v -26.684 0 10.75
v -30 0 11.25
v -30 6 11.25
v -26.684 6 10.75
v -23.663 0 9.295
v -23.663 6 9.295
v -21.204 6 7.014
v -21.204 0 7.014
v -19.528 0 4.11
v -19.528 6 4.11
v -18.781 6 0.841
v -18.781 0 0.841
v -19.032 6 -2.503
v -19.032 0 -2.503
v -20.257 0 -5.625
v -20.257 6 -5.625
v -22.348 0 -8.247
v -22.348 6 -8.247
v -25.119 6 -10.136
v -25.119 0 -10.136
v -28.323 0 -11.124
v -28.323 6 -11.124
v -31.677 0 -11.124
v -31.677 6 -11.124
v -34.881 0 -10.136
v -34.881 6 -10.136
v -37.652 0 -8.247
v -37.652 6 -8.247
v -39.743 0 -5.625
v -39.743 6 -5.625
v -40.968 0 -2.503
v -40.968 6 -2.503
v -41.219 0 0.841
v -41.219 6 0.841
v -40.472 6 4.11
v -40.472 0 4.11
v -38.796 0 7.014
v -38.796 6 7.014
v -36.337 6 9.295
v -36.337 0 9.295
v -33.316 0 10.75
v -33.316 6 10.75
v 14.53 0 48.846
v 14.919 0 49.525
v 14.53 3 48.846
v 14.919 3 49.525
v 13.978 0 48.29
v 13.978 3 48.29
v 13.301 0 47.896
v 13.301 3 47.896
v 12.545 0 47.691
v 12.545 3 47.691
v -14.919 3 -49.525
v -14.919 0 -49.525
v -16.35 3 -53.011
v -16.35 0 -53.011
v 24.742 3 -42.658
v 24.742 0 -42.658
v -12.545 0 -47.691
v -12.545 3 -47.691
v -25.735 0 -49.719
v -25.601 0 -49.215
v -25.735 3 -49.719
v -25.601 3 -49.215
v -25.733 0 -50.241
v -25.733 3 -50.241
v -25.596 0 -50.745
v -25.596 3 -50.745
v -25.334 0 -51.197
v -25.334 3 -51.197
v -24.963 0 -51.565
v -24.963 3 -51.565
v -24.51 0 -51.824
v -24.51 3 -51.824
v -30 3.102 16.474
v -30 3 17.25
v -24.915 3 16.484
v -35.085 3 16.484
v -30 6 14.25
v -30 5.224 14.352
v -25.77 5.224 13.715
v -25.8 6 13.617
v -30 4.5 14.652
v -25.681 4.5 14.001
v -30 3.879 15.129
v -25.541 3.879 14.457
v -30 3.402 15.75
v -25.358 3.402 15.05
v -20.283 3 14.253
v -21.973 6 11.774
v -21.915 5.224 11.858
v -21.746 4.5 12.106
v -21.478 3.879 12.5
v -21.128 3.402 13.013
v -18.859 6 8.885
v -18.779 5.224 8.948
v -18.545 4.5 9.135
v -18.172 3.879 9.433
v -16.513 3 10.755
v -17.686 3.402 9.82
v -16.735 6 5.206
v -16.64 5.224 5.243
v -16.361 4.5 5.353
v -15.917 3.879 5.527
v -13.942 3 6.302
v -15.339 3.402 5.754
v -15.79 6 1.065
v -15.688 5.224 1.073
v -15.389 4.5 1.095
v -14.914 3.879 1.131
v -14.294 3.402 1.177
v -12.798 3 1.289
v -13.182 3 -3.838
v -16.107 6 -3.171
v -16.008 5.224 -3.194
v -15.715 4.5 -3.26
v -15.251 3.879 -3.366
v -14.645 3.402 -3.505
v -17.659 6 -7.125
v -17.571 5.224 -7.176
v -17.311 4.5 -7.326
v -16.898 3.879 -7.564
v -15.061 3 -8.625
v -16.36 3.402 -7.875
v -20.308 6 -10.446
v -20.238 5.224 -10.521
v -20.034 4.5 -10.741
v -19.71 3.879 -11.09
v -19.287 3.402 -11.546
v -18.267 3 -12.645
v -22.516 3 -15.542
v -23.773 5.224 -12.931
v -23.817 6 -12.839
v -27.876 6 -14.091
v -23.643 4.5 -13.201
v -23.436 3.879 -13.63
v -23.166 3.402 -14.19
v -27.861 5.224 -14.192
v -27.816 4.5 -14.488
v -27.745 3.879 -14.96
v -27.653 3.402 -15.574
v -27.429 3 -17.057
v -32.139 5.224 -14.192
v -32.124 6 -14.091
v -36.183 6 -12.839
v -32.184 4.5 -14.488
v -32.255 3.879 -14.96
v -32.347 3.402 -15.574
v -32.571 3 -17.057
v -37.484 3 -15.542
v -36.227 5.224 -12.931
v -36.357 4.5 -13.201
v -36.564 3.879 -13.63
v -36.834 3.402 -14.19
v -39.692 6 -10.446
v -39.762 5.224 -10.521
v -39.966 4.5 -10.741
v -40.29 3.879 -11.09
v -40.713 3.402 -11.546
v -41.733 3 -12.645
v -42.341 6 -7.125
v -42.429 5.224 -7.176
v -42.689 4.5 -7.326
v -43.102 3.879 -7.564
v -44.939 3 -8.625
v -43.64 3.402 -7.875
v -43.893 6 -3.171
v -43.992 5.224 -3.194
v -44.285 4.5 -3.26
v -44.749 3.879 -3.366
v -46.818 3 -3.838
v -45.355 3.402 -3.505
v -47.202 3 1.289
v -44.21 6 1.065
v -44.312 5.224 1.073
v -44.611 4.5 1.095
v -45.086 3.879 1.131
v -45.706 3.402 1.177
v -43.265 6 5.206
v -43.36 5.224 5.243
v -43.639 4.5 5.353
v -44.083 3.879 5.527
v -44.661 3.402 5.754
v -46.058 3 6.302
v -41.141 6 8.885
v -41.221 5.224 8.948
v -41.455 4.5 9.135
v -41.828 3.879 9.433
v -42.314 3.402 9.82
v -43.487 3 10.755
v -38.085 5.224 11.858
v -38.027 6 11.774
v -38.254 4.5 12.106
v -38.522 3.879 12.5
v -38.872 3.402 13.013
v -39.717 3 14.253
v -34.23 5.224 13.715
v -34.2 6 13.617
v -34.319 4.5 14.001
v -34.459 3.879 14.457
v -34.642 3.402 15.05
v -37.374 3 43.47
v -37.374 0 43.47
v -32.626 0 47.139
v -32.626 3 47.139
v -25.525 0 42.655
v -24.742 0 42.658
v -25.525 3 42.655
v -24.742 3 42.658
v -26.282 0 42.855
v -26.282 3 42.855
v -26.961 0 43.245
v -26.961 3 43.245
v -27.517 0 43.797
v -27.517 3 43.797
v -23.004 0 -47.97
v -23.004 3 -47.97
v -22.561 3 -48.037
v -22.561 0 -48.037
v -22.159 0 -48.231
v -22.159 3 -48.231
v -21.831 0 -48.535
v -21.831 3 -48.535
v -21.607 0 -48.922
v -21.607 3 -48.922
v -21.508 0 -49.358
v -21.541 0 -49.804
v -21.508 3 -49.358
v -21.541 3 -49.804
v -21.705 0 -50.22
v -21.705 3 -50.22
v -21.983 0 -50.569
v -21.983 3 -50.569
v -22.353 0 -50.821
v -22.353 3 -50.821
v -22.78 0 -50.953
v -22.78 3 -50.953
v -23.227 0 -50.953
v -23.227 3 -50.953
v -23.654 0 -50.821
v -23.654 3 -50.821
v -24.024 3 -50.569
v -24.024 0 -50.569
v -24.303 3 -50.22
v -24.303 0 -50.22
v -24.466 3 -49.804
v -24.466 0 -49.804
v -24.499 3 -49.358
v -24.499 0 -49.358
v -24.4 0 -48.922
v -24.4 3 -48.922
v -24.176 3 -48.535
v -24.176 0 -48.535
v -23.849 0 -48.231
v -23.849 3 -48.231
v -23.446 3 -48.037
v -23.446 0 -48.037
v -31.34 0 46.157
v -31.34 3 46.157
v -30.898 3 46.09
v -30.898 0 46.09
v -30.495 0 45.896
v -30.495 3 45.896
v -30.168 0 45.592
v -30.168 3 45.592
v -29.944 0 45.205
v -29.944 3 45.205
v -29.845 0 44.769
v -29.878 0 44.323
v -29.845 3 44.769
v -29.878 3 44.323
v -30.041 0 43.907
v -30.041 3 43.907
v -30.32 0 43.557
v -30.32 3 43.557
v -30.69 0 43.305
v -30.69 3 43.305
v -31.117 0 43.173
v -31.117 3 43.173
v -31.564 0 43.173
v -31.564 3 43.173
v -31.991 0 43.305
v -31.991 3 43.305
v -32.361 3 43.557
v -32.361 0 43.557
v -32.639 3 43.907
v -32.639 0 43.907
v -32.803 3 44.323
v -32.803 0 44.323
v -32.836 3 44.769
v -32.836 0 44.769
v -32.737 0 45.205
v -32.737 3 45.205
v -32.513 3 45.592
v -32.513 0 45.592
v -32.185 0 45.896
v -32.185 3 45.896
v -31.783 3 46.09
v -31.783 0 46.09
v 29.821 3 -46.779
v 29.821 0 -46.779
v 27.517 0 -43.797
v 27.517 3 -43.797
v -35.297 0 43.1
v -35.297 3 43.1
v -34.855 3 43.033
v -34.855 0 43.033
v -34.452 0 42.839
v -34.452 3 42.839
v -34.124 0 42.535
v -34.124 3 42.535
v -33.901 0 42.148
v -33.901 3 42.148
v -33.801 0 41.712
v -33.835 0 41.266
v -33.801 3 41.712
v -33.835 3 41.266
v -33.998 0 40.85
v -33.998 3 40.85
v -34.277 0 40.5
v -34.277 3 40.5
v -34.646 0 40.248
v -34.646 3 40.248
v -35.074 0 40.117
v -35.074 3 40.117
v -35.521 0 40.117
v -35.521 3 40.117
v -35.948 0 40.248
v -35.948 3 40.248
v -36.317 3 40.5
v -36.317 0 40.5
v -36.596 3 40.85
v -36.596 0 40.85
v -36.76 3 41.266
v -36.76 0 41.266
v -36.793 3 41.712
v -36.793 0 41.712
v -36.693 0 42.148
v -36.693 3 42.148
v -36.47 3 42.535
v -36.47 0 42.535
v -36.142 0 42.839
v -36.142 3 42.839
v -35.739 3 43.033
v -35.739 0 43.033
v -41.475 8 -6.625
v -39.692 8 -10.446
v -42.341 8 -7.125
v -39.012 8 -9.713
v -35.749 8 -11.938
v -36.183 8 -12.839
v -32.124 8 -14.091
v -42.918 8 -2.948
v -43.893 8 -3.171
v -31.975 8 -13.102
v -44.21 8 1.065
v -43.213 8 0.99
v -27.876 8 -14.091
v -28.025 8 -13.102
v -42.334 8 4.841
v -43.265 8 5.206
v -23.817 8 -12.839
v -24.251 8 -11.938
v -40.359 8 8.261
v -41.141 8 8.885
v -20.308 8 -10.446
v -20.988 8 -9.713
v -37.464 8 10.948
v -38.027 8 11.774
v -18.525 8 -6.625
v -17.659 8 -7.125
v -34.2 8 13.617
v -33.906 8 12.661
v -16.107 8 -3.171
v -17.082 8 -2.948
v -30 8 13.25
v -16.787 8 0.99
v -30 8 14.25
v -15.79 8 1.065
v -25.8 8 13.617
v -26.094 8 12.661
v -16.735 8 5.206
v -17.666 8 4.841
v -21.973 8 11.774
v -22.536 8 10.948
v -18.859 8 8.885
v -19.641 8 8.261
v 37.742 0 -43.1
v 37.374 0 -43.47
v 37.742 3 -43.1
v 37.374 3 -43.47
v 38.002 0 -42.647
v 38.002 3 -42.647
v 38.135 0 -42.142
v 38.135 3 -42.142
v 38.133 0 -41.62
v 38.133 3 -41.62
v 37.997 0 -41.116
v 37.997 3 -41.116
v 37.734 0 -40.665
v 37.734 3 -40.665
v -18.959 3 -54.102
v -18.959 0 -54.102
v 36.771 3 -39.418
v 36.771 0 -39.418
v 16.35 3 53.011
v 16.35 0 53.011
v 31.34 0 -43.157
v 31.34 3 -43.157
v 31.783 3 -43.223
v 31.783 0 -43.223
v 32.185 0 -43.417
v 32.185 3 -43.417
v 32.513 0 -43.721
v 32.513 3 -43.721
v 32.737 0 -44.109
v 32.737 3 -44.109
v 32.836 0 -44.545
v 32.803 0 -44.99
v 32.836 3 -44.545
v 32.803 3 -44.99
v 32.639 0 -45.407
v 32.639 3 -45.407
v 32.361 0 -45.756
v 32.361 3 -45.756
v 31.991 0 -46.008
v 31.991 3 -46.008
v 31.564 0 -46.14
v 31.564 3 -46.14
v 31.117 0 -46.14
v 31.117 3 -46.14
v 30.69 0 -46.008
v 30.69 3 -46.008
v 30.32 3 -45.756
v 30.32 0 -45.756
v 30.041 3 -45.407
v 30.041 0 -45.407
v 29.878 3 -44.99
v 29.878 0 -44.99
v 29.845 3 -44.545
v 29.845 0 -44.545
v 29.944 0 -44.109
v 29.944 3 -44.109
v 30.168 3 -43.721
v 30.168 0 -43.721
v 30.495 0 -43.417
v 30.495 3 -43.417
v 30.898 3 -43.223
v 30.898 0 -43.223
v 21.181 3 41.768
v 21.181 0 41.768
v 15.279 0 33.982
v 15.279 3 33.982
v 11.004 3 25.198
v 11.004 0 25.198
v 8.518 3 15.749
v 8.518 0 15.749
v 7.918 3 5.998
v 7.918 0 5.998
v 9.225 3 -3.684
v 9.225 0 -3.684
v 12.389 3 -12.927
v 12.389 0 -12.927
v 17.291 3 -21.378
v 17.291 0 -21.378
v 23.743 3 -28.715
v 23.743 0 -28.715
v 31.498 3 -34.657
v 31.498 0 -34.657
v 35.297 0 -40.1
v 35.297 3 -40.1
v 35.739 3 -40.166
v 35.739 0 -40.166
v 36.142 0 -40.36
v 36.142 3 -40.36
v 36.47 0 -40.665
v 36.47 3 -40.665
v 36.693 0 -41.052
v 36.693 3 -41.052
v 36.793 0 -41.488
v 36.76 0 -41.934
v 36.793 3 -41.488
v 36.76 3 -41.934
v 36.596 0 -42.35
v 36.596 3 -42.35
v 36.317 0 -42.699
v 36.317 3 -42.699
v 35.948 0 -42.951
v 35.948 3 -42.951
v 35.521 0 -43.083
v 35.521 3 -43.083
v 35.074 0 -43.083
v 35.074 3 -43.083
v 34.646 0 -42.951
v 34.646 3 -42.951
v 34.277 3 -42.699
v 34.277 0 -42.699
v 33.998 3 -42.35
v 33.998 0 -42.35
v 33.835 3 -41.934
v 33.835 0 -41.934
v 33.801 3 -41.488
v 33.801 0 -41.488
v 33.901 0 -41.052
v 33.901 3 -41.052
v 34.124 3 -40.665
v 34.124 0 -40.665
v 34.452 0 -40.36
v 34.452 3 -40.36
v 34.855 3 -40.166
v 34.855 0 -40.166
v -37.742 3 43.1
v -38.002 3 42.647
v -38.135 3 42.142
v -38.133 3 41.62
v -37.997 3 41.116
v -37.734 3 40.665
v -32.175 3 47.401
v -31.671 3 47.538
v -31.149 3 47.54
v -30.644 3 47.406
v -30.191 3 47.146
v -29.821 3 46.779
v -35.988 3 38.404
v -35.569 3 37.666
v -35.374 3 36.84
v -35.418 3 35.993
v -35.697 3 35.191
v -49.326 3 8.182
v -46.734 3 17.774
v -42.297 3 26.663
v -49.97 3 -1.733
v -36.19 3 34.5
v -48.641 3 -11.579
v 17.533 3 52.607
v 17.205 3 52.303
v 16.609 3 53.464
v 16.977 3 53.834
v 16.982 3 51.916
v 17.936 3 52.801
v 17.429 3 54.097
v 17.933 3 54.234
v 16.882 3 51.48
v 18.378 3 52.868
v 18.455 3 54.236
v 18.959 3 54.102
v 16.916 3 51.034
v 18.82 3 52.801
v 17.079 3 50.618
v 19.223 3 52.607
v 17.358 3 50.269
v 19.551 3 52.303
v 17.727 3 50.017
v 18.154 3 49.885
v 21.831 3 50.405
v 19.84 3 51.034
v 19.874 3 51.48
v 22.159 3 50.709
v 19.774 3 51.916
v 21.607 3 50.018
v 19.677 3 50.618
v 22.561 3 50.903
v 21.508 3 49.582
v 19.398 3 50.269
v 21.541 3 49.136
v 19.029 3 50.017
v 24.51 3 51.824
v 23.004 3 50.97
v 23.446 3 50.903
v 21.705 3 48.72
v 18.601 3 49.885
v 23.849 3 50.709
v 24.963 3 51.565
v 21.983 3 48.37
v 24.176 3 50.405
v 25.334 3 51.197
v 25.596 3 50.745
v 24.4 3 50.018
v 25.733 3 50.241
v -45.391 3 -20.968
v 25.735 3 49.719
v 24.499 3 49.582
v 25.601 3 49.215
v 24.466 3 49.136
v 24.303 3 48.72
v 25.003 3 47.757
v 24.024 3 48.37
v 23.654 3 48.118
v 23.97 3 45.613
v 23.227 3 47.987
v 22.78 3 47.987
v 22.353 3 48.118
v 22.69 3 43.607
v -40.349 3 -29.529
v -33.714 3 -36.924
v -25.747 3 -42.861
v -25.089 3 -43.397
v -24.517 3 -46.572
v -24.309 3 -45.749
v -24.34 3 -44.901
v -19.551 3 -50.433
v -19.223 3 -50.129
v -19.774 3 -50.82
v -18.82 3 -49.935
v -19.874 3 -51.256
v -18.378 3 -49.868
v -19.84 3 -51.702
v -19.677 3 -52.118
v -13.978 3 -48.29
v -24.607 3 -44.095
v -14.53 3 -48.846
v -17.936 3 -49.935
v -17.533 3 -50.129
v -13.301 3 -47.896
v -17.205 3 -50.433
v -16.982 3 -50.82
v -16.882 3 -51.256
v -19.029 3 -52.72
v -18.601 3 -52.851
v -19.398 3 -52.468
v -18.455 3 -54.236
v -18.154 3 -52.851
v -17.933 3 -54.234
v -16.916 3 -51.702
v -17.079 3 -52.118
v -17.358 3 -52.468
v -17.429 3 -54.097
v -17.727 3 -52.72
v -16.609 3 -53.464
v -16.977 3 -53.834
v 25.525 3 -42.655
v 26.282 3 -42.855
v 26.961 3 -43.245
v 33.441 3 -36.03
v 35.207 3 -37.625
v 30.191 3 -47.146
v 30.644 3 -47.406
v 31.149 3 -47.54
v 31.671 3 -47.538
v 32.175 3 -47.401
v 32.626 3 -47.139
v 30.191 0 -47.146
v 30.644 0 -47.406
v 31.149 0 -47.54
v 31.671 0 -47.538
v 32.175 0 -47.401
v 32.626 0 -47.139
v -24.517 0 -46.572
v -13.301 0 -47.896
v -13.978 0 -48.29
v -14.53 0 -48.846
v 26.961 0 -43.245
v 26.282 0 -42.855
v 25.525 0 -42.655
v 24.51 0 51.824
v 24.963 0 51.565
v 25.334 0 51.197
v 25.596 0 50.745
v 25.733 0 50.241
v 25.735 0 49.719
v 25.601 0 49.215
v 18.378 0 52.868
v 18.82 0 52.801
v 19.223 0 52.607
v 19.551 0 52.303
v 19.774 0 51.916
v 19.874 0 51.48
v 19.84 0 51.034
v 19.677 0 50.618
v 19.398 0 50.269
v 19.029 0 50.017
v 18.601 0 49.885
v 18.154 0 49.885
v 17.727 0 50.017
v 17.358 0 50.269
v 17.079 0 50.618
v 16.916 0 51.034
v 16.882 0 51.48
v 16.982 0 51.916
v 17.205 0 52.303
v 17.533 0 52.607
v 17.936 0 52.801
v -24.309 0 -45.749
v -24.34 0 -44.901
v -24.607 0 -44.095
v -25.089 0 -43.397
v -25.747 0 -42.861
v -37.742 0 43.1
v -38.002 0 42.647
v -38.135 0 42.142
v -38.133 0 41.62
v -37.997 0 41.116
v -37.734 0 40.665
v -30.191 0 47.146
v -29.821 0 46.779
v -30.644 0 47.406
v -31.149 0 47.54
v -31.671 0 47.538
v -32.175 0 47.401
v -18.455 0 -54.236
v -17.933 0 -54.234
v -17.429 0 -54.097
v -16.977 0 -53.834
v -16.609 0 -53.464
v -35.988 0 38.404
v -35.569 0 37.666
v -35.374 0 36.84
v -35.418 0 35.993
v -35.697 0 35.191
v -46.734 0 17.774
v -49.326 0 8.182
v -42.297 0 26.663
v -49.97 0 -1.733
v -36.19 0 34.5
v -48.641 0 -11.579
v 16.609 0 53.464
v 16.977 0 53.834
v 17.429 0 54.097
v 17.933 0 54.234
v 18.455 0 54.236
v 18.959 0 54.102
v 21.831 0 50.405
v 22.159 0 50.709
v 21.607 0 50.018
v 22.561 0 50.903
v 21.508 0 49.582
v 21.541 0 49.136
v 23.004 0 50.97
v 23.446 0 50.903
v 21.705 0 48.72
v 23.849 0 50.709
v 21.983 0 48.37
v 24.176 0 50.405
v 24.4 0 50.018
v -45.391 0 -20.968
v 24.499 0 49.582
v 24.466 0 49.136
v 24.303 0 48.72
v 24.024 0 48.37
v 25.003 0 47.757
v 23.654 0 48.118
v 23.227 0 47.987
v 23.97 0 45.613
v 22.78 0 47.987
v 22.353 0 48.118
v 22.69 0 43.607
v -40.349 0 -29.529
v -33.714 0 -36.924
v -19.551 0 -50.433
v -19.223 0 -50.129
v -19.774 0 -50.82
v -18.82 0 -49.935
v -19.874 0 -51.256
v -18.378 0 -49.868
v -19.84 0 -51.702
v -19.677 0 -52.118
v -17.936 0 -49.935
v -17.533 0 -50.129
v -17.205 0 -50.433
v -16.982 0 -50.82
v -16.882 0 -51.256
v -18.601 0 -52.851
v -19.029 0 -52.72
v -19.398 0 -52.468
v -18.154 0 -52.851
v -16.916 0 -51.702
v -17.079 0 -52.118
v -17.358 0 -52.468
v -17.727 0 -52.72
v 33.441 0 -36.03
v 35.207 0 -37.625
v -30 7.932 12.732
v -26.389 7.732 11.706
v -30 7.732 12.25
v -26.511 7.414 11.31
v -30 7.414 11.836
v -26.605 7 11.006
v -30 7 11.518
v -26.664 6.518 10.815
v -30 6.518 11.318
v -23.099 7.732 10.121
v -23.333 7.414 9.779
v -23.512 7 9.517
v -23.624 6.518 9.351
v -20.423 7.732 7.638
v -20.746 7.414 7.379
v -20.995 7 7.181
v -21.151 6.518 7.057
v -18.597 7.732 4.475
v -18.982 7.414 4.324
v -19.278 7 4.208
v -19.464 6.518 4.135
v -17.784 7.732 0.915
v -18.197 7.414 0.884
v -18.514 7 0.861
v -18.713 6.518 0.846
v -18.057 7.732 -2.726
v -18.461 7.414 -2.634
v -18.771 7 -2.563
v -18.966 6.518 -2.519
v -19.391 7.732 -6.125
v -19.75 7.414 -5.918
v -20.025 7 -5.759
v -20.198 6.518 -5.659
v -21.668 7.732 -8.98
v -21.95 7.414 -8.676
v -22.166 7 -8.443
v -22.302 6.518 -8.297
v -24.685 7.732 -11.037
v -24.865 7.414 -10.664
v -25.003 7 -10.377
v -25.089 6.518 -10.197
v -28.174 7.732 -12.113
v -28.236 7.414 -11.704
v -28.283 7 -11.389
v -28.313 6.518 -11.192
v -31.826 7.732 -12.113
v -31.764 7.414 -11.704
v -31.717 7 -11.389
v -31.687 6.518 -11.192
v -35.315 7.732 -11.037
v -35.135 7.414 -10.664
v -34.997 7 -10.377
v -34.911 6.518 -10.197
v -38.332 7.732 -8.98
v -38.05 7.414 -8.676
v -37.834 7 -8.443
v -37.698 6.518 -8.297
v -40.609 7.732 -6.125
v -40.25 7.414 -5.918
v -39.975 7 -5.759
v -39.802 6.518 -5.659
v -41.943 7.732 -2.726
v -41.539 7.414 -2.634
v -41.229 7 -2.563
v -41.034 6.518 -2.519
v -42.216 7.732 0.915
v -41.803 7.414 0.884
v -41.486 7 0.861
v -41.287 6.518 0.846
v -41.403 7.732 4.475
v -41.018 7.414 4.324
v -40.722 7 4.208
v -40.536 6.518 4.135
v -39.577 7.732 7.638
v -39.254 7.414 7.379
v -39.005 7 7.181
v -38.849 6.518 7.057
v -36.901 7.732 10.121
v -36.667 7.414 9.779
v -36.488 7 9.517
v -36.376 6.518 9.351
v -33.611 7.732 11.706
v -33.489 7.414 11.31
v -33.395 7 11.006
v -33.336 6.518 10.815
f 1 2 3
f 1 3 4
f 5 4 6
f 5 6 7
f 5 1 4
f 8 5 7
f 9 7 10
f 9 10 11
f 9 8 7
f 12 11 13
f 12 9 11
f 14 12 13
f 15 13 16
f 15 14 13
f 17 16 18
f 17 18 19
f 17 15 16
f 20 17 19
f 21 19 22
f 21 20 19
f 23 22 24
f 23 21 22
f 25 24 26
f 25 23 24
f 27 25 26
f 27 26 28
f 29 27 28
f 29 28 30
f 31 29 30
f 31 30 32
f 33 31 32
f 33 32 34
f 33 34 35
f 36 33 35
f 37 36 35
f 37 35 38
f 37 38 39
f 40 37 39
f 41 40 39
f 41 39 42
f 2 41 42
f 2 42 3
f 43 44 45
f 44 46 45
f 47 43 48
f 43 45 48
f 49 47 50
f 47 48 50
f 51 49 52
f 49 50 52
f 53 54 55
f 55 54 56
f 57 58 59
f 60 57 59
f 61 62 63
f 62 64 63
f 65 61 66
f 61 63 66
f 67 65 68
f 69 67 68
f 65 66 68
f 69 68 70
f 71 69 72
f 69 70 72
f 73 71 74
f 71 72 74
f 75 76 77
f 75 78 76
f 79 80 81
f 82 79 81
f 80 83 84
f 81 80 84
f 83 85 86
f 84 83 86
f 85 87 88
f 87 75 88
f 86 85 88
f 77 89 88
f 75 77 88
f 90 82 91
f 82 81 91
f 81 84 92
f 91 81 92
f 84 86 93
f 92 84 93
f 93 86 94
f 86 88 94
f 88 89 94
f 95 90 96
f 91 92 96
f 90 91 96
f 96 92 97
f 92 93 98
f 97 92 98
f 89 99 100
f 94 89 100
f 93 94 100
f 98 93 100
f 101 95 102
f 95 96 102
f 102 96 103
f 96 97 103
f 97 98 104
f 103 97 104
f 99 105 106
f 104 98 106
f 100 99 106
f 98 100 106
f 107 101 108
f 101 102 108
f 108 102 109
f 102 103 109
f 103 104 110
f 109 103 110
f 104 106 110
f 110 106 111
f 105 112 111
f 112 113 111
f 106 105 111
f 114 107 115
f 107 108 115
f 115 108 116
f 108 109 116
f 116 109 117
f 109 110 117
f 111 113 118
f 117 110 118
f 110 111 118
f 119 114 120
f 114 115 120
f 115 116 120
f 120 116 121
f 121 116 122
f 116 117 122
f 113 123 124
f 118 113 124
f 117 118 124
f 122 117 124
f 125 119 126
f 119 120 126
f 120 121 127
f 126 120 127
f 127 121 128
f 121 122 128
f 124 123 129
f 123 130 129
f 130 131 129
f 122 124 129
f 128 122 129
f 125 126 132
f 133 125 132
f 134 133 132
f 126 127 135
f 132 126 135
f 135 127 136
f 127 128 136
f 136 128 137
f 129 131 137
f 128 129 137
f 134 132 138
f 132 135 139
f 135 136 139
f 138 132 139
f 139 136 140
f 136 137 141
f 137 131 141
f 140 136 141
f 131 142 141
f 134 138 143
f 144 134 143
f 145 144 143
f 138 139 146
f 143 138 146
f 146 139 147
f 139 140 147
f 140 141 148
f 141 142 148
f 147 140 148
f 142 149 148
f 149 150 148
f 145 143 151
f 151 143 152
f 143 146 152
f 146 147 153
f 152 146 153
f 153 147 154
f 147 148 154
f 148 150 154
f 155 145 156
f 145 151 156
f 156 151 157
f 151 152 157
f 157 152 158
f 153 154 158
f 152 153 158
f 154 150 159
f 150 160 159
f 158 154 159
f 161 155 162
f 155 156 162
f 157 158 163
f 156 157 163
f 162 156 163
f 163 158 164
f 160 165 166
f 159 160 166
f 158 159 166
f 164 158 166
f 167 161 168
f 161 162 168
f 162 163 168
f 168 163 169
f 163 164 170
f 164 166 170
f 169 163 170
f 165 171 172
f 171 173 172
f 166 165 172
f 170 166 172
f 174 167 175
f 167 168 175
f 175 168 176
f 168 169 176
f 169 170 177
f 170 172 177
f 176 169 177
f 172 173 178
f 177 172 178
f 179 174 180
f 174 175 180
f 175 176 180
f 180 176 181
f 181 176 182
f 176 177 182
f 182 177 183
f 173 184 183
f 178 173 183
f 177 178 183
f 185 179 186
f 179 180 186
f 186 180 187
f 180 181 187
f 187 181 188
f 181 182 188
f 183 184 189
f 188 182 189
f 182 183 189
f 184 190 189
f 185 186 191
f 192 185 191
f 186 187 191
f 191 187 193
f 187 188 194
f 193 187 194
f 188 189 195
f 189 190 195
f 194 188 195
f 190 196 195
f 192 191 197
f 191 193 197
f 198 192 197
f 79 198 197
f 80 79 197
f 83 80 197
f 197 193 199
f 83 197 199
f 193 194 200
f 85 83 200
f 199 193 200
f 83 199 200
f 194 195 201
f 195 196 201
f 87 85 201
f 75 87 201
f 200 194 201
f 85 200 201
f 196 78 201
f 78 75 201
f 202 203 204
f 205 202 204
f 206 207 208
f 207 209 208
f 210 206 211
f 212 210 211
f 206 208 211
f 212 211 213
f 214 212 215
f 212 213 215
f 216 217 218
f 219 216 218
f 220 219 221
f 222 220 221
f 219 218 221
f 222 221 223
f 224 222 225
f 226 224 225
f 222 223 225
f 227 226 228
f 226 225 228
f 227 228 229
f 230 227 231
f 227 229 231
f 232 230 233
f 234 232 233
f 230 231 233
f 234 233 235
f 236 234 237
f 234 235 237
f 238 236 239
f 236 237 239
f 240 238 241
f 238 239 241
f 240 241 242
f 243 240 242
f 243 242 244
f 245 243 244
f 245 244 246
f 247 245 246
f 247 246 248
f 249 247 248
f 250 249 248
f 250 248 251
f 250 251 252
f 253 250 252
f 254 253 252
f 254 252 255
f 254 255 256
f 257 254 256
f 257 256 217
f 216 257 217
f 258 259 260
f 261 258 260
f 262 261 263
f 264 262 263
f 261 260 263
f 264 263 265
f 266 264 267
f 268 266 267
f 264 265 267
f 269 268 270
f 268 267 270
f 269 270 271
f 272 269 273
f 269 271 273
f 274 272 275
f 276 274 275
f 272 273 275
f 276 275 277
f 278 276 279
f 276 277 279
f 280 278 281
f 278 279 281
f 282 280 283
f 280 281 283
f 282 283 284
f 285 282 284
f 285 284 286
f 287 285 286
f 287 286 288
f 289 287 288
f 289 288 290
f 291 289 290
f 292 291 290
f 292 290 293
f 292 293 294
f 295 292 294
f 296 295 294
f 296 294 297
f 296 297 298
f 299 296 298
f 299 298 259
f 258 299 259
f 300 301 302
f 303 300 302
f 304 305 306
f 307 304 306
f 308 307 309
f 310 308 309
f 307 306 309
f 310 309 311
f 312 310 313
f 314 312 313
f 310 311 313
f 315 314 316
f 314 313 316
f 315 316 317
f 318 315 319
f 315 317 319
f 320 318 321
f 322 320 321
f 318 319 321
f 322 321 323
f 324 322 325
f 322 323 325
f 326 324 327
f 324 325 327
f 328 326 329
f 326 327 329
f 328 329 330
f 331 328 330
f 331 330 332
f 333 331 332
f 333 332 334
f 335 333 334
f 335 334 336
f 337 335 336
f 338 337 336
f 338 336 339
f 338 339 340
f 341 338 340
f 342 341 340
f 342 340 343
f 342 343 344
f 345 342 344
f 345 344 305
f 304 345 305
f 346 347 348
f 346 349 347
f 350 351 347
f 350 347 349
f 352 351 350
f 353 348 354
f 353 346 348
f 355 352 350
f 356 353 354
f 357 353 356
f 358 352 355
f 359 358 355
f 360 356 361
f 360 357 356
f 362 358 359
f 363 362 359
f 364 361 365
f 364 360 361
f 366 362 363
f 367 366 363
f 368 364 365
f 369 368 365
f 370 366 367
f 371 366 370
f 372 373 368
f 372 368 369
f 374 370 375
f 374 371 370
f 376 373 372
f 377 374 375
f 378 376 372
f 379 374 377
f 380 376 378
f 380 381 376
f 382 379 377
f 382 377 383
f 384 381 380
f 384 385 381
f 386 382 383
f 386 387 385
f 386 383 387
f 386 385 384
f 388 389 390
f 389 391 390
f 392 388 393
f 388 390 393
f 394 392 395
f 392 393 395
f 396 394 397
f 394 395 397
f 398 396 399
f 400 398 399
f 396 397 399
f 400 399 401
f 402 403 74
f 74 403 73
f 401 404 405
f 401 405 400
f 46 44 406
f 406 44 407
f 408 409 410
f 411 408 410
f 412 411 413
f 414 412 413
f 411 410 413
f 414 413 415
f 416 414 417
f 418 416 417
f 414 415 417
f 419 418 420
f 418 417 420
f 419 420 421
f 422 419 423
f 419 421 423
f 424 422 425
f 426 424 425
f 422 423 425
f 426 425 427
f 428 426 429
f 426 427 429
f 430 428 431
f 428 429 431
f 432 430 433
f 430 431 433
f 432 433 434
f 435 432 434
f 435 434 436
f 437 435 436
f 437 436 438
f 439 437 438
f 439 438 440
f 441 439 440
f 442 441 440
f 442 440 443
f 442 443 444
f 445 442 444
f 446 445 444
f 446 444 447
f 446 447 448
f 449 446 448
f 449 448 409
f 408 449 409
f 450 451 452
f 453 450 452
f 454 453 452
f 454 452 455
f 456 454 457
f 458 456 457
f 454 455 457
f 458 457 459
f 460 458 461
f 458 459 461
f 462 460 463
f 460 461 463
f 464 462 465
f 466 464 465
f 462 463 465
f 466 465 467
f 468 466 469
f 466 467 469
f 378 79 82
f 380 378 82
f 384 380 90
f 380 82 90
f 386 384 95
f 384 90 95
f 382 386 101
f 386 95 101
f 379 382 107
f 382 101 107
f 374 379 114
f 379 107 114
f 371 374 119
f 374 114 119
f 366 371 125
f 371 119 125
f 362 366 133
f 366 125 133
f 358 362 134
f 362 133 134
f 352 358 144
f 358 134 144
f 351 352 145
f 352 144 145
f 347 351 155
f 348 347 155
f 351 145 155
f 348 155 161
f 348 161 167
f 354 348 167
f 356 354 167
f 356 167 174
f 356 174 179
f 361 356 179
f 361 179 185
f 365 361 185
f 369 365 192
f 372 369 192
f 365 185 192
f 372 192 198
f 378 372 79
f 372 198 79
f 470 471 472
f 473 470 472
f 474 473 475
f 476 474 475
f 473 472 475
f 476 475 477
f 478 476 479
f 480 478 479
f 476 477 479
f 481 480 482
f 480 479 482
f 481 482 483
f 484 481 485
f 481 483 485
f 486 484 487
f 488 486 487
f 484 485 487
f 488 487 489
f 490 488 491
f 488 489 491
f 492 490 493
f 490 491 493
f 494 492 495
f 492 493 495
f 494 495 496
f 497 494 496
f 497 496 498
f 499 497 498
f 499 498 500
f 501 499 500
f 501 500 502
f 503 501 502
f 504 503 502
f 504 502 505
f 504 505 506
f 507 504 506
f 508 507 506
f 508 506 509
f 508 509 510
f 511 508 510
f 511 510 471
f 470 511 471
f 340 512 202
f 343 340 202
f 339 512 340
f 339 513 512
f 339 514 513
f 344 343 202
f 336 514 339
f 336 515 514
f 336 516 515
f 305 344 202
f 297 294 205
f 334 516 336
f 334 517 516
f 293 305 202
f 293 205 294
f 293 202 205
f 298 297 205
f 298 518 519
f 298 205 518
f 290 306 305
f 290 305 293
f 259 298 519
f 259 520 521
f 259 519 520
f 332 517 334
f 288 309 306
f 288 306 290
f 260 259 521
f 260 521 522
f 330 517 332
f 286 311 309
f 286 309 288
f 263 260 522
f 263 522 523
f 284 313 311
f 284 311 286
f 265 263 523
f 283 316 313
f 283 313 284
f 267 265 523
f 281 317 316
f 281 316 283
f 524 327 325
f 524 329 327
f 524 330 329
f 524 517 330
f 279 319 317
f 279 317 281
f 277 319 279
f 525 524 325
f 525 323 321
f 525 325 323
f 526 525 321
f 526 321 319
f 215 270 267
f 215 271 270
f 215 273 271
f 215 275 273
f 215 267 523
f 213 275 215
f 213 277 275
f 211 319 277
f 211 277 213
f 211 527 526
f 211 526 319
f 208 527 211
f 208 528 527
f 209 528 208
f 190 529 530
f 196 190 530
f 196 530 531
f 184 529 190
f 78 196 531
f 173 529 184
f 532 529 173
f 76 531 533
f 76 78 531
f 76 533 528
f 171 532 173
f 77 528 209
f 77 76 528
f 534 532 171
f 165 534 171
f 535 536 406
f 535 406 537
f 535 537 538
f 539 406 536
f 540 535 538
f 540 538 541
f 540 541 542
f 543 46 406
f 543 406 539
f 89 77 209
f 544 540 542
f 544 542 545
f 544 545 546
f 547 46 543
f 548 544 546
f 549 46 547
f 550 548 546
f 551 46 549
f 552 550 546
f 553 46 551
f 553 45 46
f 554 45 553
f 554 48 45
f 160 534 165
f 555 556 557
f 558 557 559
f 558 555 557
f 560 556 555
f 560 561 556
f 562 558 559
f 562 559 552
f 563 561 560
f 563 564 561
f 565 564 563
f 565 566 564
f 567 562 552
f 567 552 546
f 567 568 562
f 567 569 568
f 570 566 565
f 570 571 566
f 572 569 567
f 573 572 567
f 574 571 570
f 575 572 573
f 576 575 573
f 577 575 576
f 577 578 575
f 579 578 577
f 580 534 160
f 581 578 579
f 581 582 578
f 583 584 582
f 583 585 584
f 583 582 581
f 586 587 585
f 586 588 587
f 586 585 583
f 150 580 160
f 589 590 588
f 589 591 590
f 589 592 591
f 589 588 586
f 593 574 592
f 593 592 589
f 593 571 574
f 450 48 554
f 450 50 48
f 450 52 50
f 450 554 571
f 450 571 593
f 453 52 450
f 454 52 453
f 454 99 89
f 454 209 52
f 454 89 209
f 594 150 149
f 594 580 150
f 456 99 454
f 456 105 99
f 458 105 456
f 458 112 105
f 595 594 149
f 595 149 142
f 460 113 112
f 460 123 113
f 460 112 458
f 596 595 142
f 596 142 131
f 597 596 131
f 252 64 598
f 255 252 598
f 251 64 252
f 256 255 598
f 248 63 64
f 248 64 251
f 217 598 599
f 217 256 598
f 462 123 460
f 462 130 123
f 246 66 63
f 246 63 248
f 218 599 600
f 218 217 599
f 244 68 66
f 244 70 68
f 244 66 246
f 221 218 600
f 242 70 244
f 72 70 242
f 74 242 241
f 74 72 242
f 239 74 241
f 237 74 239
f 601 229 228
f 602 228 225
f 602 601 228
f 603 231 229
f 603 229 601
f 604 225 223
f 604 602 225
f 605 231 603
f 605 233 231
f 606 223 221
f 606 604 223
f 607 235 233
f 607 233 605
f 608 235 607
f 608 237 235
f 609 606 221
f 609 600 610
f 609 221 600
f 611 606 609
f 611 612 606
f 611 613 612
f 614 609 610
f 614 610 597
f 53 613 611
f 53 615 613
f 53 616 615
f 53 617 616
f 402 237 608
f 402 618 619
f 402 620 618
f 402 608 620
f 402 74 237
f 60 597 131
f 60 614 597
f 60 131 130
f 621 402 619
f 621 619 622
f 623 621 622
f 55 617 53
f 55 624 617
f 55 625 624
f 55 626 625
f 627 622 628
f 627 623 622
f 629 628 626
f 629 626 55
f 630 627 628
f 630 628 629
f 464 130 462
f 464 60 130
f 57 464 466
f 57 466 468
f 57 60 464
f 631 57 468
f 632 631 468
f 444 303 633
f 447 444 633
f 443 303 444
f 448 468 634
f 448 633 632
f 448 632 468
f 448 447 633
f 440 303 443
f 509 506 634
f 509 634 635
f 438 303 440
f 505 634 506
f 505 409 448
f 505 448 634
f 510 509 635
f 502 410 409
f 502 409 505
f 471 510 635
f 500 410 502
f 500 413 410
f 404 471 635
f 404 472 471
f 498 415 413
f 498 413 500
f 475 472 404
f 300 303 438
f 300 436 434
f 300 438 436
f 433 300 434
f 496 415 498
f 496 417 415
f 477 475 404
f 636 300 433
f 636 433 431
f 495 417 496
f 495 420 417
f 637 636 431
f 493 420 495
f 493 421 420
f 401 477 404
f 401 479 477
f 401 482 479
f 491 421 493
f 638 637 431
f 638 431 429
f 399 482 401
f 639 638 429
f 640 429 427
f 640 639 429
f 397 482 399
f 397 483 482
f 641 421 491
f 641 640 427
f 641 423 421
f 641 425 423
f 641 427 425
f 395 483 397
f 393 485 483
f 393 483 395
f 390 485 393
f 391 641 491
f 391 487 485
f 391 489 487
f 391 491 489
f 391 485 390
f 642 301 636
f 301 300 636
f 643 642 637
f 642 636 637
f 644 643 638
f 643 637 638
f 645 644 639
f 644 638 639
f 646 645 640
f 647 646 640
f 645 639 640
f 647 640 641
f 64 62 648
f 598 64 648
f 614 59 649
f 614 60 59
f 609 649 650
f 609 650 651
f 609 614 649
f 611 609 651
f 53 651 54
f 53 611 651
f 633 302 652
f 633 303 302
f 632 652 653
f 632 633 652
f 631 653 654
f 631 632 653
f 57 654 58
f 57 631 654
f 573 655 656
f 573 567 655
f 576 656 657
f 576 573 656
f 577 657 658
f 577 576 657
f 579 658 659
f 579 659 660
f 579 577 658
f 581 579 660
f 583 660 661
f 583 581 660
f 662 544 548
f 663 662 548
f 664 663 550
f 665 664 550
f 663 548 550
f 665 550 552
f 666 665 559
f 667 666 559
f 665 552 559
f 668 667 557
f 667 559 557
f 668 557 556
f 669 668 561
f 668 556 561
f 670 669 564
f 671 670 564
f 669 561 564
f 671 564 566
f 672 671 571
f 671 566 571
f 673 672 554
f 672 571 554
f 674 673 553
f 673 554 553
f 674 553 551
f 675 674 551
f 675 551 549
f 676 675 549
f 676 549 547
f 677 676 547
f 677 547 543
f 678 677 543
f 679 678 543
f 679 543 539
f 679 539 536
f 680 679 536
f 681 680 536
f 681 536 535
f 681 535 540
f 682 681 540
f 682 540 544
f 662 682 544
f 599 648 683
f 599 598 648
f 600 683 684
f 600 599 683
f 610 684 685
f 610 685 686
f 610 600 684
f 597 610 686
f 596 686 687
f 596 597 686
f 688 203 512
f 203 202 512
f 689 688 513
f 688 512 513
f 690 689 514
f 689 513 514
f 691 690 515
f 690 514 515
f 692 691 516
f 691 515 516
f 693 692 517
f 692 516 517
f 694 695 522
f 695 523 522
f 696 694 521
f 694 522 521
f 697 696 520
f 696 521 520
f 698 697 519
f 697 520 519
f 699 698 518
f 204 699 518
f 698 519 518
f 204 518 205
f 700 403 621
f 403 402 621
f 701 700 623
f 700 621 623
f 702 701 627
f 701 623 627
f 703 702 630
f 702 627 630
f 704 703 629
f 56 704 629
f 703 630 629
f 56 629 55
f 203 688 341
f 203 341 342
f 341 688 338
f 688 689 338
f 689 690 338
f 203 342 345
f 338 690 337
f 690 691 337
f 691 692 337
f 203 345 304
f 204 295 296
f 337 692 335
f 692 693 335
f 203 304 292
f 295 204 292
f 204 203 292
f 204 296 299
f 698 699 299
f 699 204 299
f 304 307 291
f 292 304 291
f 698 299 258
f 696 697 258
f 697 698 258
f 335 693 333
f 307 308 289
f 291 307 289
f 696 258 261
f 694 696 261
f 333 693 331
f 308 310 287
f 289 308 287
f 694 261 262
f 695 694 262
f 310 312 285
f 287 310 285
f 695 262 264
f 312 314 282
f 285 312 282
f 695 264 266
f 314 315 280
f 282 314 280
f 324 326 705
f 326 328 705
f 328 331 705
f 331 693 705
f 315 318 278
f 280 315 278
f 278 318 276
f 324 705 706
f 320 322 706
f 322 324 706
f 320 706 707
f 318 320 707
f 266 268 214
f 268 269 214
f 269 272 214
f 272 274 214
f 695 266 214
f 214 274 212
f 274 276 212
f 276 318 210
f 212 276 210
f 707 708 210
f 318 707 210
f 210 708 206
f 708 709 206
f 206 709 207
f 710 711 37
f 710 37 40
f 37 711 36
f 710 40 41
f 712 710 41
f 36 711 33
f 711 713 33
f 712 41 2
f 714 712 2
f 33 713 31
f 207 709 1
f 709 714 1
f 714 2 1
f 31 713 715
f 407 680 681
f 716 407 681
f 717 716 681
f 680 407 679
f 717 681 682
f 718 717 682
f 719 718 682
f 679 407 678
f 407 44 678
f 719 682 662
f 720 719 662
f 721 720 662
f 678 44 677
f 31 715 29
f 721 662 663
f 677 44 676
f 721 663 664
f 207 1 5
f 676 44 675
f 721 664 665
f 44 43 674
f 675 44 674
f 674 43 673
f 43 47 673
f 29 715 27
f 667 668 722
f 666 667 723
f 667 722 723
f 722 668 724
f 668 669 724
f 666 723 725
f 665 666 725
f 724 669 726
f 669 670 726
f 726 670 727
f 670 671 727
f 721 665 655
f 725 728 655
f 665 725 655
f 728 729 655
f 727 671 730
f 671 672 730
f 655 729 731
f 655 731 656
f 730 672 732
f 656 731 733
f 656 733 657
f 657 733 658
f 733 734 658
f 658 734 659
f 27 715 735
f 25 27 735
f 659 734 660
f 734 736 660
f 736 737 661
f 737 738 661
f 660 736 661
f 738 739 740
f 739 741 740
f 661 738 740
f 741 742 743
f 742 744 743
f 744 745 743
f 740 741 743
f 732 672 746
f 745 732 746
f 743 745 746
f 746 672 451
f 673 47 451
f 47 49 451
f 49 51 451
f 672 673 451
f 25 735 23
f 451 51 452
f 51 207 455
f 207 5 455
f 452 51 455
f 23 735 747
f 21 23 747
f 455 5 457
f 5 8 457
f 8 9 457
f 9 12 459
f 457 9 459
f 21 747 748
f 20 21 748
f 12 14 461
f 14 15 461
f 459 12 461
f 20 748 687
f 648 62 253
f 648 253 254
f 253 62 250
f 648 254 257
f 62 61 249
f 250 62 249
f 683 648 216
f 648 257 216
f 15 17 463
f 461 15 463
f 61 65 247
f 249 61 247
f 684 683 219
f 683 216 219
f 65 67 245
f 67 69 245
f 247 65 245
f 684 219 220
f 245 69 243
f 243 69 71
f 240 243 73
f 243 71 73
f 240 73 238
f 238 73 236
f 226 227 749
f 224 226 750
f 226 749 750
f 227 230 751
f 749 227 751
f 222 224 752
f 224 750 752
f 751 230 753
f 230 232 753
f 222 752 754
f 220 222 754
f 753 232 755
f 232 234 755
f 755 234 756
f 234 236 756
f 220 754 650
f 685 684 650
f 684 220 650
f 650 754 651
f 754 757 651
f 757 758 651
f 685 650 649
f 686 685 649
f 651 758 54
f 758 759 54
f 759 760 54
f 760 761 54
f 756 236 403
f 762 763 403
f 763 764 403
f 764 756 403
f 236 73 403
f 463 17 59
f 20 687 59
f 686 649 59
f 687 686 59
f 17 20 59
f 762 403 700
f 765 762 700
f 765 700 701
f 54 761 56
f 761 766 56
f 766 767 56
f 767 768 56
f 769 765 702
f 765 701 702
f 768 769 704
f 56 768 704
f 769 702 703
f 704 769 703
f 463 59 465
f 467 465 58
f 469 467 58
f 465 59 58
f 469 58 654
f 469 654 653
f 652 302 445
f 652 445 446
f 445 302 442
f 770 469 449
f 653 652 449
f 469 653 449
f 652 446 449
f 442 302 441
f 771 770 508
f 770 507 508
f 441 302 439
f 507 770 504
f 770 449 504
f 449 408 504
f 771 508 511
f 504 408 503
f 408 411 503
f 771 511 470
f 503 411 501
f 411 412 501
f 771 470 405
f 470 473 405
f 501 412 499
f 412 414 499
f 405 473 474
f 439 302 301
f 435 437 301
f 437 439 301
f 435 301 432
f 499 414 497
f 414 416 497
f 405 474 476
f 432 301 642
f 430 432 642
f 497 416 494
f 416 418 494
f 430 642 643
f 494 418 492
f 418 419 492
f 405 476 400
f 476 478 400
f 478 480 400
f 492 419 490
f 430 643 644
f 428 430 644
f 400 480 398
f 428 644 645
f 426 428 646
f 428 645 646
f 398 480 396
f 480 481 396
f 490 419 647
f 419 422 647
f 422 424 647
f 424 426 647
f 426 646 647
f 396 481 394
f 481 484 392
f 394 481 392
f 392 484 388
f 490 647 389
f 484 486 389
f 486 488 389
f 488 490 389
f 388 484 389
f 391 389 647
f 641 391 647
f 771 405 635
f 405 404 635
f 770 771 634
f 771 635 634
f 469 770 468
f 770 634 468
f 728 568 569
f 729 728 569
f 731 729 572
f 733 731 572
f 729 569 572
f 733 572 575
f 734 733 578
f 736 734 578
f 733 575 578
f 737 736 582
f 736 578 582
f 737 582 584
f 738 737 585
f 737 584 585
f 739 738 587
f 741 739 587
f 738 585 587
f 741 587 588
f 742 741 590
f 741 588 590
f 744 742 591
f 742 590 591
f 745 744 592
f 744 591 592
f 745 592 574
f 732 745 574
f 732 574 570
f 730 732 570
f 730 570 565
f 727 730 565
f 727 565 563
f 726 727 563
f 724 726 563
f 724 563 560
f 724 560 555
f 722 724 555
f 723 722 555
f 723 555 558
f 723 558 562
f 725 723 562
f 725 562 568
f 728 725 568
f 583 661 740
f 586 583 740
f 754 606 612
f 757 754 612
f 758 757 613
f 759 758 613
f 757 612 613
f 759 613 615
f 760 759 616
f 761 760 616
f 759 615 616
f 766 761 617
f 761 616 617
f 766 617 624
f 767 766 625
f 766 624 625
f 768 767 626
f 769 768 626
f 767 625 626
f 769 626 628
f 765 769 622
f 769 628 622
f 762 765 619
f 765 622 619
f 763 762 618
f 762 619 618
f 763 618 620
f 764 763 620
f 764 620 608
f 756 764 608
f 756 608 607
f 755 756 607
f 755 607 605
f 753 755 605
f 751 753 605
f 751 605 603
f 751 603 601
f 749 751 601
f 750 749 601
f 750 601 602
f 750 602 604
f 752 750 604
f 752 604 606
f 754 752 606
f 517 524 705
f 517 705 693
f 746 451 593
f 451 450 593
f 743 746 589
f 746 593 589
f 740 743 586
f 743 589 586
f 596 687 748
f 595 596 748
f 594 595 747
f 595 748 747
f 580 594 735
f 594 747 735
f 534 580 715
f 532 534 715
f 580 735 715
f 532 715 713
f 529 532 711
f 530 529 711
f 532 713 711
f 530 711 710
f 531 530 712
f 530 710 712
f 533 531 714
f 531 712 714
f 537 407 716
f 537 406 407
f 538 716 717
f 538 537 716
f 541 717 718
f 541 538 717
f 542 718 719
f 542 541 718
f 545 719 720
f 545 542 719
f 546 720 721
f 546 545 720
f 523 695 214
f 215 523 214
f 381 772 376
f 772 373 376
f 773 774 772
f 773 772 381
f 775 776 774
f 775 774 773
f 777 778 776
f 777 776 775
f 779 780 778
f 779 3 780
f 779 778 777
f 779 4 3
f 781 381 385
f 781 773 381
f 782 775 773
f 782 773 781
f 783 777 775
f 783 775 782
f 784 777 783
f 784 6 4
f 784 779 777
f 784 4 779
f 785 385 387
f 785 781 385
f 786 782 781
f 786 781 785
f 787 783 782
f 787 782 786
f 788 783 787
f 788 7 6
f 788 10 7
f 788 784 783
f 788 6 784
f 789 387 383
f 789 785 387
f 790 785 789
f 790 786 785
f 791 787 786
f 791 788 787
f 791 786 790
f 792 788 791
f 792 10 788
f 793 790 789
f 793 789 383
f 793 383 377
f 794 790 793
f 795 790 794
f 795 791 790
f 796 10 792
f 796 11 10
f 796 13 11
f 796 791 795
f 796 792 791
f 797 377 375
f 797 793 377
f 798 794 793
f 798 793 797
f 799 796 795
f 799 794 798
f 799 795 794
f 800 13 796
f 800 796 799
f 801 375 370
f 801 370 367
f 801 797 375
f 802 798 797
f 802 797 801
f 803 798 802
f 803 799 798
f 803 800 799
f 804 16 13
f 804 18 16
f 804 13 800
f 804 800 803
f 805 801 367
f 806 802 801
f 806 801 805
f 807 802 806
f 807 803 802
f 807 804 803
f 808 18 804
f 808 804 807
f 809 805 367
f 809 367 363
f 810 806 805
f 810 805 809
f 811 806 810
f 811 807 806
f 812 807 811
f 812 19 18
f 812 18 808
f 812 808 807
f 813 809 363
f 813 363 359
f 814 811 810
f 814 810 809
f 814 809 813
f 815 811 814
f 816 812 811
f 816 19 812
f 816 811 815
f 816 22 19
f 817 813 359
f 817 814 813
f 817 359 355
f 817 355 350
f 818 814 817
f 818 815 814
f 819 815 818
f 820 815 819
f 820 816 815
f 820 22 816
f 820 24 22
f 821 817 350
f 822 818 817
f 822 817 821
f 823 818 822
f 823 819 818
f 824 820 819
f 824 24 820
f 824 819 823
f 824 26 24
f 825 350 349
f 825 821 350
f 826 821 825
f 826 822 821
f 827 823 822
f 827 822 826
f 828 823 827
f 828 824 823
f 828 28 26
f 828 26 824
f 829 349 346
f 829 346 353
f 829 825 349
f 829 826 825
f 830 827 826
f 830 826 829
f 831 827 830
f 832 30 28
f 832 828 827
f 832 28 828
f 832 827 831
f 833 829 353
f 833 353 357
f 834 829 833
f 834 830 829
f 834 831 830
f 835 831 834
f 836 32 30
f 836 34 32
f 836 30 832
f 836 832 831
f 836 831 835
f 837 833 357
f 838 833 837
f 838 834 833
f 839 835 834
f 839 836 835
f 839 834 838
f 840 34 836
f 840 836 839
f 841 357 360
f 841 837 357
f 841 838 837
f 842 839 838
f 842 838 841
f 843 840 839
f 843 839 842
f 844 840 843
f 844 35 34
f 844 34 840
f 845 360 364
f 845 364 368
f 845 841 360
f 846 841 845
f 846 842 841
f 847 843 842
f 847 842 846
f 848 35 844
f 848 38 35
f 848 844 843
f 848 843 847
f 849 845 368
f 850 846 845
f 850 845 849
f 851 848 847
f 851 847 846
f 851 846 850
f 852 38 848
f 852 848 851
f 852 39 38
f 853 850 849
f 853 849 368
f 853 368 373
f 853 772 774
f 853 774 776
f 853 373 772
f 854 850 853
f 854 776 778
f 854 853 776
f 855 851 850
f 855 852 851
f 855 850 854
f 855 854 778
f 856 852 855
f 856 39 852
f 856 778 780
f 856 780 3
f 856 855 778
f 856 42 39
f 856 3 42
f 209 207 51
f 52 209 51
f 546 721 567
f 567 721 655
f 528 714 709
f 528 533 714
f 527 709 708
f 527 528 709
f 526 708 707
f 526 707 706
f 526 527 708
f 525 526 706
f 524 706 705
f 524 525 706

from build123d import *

# Parameters (mm, degrees)
BOSS_EXTRUDE1_DEPTH   = 3
BOSS_EXTRUDE1_2_DEPTH = 3
BOSS_EXTRUDE1_3_DEPTH = 3
BOSS_EXTRUDE1_4_DEPTH = 3
BOSS_EXTRUDE2_START   = -3
SKETCH2_R             = 11.25
BOSS_EXTRUDE2_DEPTH   = 3
CUT_EXTRUDE1_REACH    = 76.288
SKETCH3_R             = 1.5
FILLET1_R             = 2
SKETCH4_R             = 14.25
SKETCH4_R_2           = 11.25
BOSS_EXTRUDE3_DEPTH   = 5
FILLET3_R             = 2
FILLET2_R             = 3
CUT_EXTRUDE2_REACH    = 76.396
SKETCH6_R             = 1.5
FILLET4_R             = 2
CUT_EXTRUDE3_REACH    = 76.396
SKETCH7_R             = 1.5
FILLET5_R             = 2
CUT_EXTRUDE4_REACH    = 75.948
SKETCH8_R             = 1.5
FILLET6_R             = 2
FILLET7_R             = 3
FILLET8_R             = 20


with BuildPart() as part:
    # Sketch1 → Boss-Extrude1 (new body)
    with BuildSketch(Plane(origin=(0, 0, 0), x_dir=(1, 0, 0), z_dir=(0, 1, 0))):
        with BuildLine():
            Line((-34.371558273, -36.312476945), (-38.95676142, -42.247619075))
            Line((-38.95676142, -42.247619075), (-31.04323858, -48.361223271))
            Line((-31.04323858, -48.361223271), (-26.458035433, -42.426081141))
            ThreePointArc((-26.458035433, -42.426081141), (-30.568020981, -39.567614198), (-34.371558273, -36.312476945))
        make_face()
    extrude(amount=BOSS_EXTRUDE1_DEPTH)



with BuildPart() as body_2:
    # Sketch1 → Boss-Extrude1 2 (new body)
    with BuildSketch(Plane(origin=(0, 0, 0), x_dir=(1, 0, 0), z_dir=(0, 1, 0))):
        with BuildLine():
            Line((14.261748373, -47.922881104), (17.109130658, -54.861354576))
            Line((17.109130658, -54.861354576), (26.360428621, -51.064844862))
            Line((26.360428621, -51.064844862), (23.513046335, -44.12637139))
            ThreePointArc((23.513046335, -44.12637139), (18.982548572, -46.256489812), (14.261748373, -47.922881104))
        make_face()
    extrude(amount=BOSS_EXTRUDE1_2_DEPTH)


with BuildPart() as body_3:
    # Sketch1 → Boss-Extrude1 3 (new body)
    with BuildSketch(Plane(origin=(0, 0, 0), x_dir=(1, 0, 0), z_dir=(0, 1, 0))):
        with BuildLine():
            Line((34.371558273, 36.312476945), (38.95676142, 42.247619075))
            Line((38.95676142, 42.247619075), (31.04323858, 48.361223271))
            Line((31.04323858, 48.361223271), (26.458035433, 42.426081141))
            ThreePointArc((26.458035433, 42.426081141), (30.568020981, 39.567614198), (34.371558273, 36.312476945))
        make_face()
    extrude(amount=BOSS_EXTRUDE1_3_DEPTH)


with BuildPart() as body_4:
    # Sketch1 → Boss-Extrude1 4 (new body)
    with BuildSketch(Plane(origin=(0, 0, 0), x_dir=(1, 0, 0), z_dir=(0, 1, 0))):
        with BuildLine():
            Line((-14.261748373, 47.922881104), (-17.109130658, 54.861354576))
            Line((-17.109130658, 54.861354576), (-26.360428621, 51.064844862))
            Line((-26.360428621, 51.064844862), (-23.513046335, 44.12637139))
            ThreePointArc((-23.513046335, 44.12637139), (-18.982548572, 46.256489812), (-14.261748373, 47.922881104))
        make_face()
    extrude(amount=BOSS_EXTRUDE1_4_DEPTH)


with BuildPart() as part_1:
    add(part.part)

    add(body_2.part)  # Boss-Extrude2 merges body 2

    add(body_3.part)  # Boss-Extrude2 merges body 3

    add(body_4.part)  # Boss-Extrude2 merges body 4
    # Sketch2 → Boss-Extrude2 (add)
    with BuildSketch(Plane(origin=(0, 3, 0), x_dir=(1, 0, 0), z_dir=(0, 1, 0)).offset(BOSS_EXTRUDE2_START)):
        with BuildLine():
            Line((-26.458035433, -42.426081141), (14.261748373, -47.922881104))
            ThreePointArc((14.261748373, -47.922881104), (18.982548572, -46.256489812), (23.513046335, -44.12637139))
            ThreePointArc((23.513046335, -44.12637139), (8.334035055, -1.125018831), (34.371558273, 36.312476945))
            ThreePointArc((34.371558273, 36.312476945), (30.568020981, 39.567614198), (26.458035433, 42.426081141))
            Line((26.458035433, 42.426081141), (-14.261748373, 47.922881104))
            ThreePointArc((-14.261748373, 47.922881104), (-18.982548572, 46.256489812), (-23.513046335, 44.12637139))
            ThreePointArc((-23.513046335, 44.12637139), (-49.550569553, 6.688875614), (-34.371558273, -36.312476945))
            ThreePointArc((-34.371558273, -36.312476945), (-30.568020981, -39.567614198), (-26.458035433, -42.426081141))
        make_face()
        with Locations(Location((-30, 0, 0), (0, 0, 270))):
            Circle(SKETCH2_R, mode=Mode.SUBTRACT)
    extrude(amount=BOSS_EXTRUDE2_DEPTH)

    # Sketch3 → Cut-Extrude1 (cut, up to next)
    with BuildSketch(Plane(origin=(0, 3, 0), x_dir=(1, 0, 0), z_dir=(0, 1, 0)), mode=Mode.PRIVATE) as cut_extrude1_sk1:
        with Locations(Location((-35.297139556, -41.599801343, 0), (0, 0, 270))):
            Circle(SKETCH3_R)
    cut_extrude1_tool1 = extrude(cut_extrude1_sk1.sketch, amount=-CUT_EXTRUDE1_REACH, mode=Mode.PRIVATE) & part_1.part
    # Sketch3 → Cut-Extrude1 (cut, up to next)
    with BuildSketch(Plane(origin=(0, 3, 0), x_dir=(1, 0, 0), z_dir=(0, 1, 0)), mode=Mode.PRIVATE) as cut_extrude1_sk2:
        with Locations(Location((-31.340378136, -44.656603441, 0), (0, 0, 270))):
            Circle(SKETCH3_R)
    cut_extrude1_tool2 = extrude(cut_extrude1_sk2.sketch, amount=-CUT_EXTRUDE1_REACH, mode=Mode.PRIVATE) & part_1.part
    add(cut_extrude1_tool1.solids().sort_by_distance((-35.29714, 3, 41.599801))[0], mode=Mode.SUBTRACT)
    add(cut_extrude1_tool2.solids().sort_by_distance((-31.340378, 3, 44.656603))[0], mode=Mode.SUBTRACT)

    # Fillet1
    fillet1_edges = [part_1.edges().sort_by_distance(p)[0] for p in [
        (-31.04323858, 1.5, 48.361223271),
        (-38.95676142, 1.5, 42.247619075),
    ]]
    fillet(fillet1_edges, radius=FILLET1_R)

    # Sketch4 → Boss-Extrude3 (add)
    with BuildSketch(Plane(origin=(0, 3, 0), x_dir=(1, 0, 0), z_dir=(0, 1, 0))):
        with Locations(Location((-30, 0, 0), (0, 0, 270))):
            Circle(SKETCH4_R)
        with Locations(Location((-30, 0, 0), (0, 0, 270))):
            Circle(SKETCH4_R_2, mode=Mode.SUBTRACT)
    extrude(amount=BOSS_EXTRUDE3_DEPTH)

    # Fillet3
    fillet3_edges = [part_1.edges().sort_by_distance(p)[0] for p in [
        (-30, 8, -11.25),
    ]]
    fillet(fillet3_edges, radius=FILLET3_R)

    # Fillet2
    fillet2_edges = [part_1.edges().sort_by_distance(p)[0] for p in [
        (-30, 3, -14.25),
    ]]
    fillet(fillet2_edges, radius=FILLET2_R)

    # Sketch6 → Cut-Extrude2 (cut, up to next)
    with BuildSketch(Plane(origin=(0, 3, 0), x_dir=(1, 0, 0), z_dir=(0, 1, 0)), mode=Mode.PRIVATE) as cut_extrude2_sk1:
        with Locations(Location((18.377914978, -51.368120208, 0), (0, 0, 270))):
            Circle(SKETCH6_R)
    cut_extrude2_tool1 = extrude(cut_extrude2_sk1.sketch, amount=-CUT_EXTRUDE2_REACH, mode=Mode.PRIVATE) & part_1.part
    # Sketch6 → Cut-Extrude2 (cut, up to next)
    with BuildSketch(Plane(origin=(0, 3, 0), x_dir=(1, 0, 0), z_dir=(0, 1, 0)), mode=Mode.PRIVATE) as cut_extrude2_sk2:
        with Locations(Location((23.003563959, -49.469865351, 0), (0, 0, 270))):
            Circle(SKETCH6_R)
    cut_extrude2_tool2 = extrude(cut_extrude2_sk2.sketch, amount=-CUT_EXTRUDE2_REACH, mode=Mode.PRIVATE) & part_1.part
    add(cut_extrude2_tool1.solids().sort_by_distance((18.377915, 3, 51.36812))[0], mode=Mode.SUBTRACT)
    add(cut_extrude2_tool2.solids().sort_by_distance((23.003564, 3, 49.469865))[0], mode=Mode.SUBTRACT)

    # Fillet4
    fillet4_edges = [part_1.edges().sort_by_distance(p)[0] for p in [
        (17.109130658, 1.5, 54.861354576),
        (26.360428621, 1.5, 51.064844862),
    ]]
    fillet(fillet4_edges, radius=FILLET4_R)

    # Sketch7 → Cut-Extrude3 (cut, up to next)
    with BuildSketch(Plane(origin=(0, 3, 0), x_dir=(1, 0, 0), z_dir=(0, 1, 0)), mode=Mode.PRIVATE) as cut_extrude3_sk1:
        with Locations(Location((-18.377914978, 51.368120208, 0), (0, 0, 270))):
            Circle(SKETCH7_R)
    cut_extrude3_tool1 = extrude(cut_extrude3_sk1.sketch, amount=-CUT_EXTRUDE3_REACH, mode=Mode.PRIVATE) & part_1.part
    # Sketch7 → Cut-Extrude3 (cut, up to next)
    with BuildSketch(Plane(origin=(0, 3, 0), x_dir=(1, 0, 0), z_dir=(0, 1, 0)), mode=Mode.PRIVATE) as cut_extrude3_sk2:
        with Locations(Location((-23.003563959, 49.469865351, 0), (0, 0, 270))):
            Circle(SKETCH7_R)
    cut_extrude3_tool2 = extrude(cut_extrude3_sk2.sketch, amount=-CUT_EXTRUDE3_REACH, mode=Mode.PRIVATE) & part_1.part
    add(cut_extrude3_tool1.solids().sort_by_distance((-18.377915, 3, -51.36812))[0], mode=Mode.SUBTRACT)
    add(cut_extrude3_tool2.solids().sort_by_distance((-23.003564, 3, -49.469865))[0], mode=Mode.SUBTRACT)

    # Fillet5
    fillet5_edges = [part_1.edges().sort_by_distance(p)[0] for p in [
        (-17.109130658, 1.5, -54.861354576),
        (-26.360428621, 1.5, -51.064844862),
    ]]
    fillet(fillet5_edges, radius=FILLET5_R)

    # Sketch8 → Cut-Extrude4 (cut, up to next)
    with BuildSketch(Plane(origin=(0, 3, 0), x_dir=(1, 0, 0), z_dir=(0, 1, 0)), mode=Mode.PRIVATE) as cut_extrude4_sk1:
        with Locations(Location((35.297139556, 41.599801343, 0), (0, 0, 270))):
            Circle(SKETCH8_R)
    cut_extrude4_tool1 = extrude(cut_extrude4_sk1.sketch, amount=-CUT_EXTRUDE4_REACH, mode=Mode.PRIVATE) & part_1.part
    # Sketch8 → Cut-Extrude4 (cut, up to next)
    with BuildSketch(Plane(origin=(0, 3, 0), x_dir=(1, 0, 0), z_dir=(0, 1, 0)), mode=Mode.PRIVATE) as cut_extrude4_sk2:
        with Locations(Location((31.340378136, 44.656603441, 0), (0, 0, 270))):
            Circle(SKETCH8_R)
    cut_extrude4_tool2 = extrude(cut_extrude4_sk2.sketch, amount=-CUT_EXTRUDE4_REACH, mode=Mode.PRIVATE) & part_1.part
    add(cut_extrude4_tool1.solids().sort_by_distance((35.29714, 3, -41.599801))[0], mode=Mode.SUBTRACT)
    add(cut_extrude4_tool2.solids().sort_by_distance((31.340378, 3, -44.656603))[0], mode=Mode.SUBTRACT)

    # Fillet6
    fillet6_edges = [part_1.edges().sort_by_distance(p)[0] for p in [
        (38.95676142, 1.5, -42.247619075),
        (31.04323858, 1.5, -48.361223271),
    ]]
    fillet(fillet6_edges, radius=FILLET6_R)

    # Fillet7
    fillet7_edges = [part_1.edges().sort_by_distance(p)[0] for p in [
        (14.261748373, 1.5, 47.922881104),
        (26.458035433, 1.5, -42.426081141),
        (-14.261748373, 1.5, -47.922881104),
        (-23.513046335, 1.5, -44.12637139),
        (-26.458035433, 1.5, 42.426081141),
        (-34.371558273, 1.5, 36.312476945),
    ]]
    fillet(fillet7_edges, radius=FILLET7_R)

    # Fillet8
    fillet8_edges = [part_1.edges().sort_by_distance(p)[0] for p in [
        (23.513046335, 1.5, 44.12637139),
        (34.371558273, 1.5, -36.312476945),
    ]]
    fillet(fillet8_edges, radius=FILLET8_R)


solid = part_1.part
